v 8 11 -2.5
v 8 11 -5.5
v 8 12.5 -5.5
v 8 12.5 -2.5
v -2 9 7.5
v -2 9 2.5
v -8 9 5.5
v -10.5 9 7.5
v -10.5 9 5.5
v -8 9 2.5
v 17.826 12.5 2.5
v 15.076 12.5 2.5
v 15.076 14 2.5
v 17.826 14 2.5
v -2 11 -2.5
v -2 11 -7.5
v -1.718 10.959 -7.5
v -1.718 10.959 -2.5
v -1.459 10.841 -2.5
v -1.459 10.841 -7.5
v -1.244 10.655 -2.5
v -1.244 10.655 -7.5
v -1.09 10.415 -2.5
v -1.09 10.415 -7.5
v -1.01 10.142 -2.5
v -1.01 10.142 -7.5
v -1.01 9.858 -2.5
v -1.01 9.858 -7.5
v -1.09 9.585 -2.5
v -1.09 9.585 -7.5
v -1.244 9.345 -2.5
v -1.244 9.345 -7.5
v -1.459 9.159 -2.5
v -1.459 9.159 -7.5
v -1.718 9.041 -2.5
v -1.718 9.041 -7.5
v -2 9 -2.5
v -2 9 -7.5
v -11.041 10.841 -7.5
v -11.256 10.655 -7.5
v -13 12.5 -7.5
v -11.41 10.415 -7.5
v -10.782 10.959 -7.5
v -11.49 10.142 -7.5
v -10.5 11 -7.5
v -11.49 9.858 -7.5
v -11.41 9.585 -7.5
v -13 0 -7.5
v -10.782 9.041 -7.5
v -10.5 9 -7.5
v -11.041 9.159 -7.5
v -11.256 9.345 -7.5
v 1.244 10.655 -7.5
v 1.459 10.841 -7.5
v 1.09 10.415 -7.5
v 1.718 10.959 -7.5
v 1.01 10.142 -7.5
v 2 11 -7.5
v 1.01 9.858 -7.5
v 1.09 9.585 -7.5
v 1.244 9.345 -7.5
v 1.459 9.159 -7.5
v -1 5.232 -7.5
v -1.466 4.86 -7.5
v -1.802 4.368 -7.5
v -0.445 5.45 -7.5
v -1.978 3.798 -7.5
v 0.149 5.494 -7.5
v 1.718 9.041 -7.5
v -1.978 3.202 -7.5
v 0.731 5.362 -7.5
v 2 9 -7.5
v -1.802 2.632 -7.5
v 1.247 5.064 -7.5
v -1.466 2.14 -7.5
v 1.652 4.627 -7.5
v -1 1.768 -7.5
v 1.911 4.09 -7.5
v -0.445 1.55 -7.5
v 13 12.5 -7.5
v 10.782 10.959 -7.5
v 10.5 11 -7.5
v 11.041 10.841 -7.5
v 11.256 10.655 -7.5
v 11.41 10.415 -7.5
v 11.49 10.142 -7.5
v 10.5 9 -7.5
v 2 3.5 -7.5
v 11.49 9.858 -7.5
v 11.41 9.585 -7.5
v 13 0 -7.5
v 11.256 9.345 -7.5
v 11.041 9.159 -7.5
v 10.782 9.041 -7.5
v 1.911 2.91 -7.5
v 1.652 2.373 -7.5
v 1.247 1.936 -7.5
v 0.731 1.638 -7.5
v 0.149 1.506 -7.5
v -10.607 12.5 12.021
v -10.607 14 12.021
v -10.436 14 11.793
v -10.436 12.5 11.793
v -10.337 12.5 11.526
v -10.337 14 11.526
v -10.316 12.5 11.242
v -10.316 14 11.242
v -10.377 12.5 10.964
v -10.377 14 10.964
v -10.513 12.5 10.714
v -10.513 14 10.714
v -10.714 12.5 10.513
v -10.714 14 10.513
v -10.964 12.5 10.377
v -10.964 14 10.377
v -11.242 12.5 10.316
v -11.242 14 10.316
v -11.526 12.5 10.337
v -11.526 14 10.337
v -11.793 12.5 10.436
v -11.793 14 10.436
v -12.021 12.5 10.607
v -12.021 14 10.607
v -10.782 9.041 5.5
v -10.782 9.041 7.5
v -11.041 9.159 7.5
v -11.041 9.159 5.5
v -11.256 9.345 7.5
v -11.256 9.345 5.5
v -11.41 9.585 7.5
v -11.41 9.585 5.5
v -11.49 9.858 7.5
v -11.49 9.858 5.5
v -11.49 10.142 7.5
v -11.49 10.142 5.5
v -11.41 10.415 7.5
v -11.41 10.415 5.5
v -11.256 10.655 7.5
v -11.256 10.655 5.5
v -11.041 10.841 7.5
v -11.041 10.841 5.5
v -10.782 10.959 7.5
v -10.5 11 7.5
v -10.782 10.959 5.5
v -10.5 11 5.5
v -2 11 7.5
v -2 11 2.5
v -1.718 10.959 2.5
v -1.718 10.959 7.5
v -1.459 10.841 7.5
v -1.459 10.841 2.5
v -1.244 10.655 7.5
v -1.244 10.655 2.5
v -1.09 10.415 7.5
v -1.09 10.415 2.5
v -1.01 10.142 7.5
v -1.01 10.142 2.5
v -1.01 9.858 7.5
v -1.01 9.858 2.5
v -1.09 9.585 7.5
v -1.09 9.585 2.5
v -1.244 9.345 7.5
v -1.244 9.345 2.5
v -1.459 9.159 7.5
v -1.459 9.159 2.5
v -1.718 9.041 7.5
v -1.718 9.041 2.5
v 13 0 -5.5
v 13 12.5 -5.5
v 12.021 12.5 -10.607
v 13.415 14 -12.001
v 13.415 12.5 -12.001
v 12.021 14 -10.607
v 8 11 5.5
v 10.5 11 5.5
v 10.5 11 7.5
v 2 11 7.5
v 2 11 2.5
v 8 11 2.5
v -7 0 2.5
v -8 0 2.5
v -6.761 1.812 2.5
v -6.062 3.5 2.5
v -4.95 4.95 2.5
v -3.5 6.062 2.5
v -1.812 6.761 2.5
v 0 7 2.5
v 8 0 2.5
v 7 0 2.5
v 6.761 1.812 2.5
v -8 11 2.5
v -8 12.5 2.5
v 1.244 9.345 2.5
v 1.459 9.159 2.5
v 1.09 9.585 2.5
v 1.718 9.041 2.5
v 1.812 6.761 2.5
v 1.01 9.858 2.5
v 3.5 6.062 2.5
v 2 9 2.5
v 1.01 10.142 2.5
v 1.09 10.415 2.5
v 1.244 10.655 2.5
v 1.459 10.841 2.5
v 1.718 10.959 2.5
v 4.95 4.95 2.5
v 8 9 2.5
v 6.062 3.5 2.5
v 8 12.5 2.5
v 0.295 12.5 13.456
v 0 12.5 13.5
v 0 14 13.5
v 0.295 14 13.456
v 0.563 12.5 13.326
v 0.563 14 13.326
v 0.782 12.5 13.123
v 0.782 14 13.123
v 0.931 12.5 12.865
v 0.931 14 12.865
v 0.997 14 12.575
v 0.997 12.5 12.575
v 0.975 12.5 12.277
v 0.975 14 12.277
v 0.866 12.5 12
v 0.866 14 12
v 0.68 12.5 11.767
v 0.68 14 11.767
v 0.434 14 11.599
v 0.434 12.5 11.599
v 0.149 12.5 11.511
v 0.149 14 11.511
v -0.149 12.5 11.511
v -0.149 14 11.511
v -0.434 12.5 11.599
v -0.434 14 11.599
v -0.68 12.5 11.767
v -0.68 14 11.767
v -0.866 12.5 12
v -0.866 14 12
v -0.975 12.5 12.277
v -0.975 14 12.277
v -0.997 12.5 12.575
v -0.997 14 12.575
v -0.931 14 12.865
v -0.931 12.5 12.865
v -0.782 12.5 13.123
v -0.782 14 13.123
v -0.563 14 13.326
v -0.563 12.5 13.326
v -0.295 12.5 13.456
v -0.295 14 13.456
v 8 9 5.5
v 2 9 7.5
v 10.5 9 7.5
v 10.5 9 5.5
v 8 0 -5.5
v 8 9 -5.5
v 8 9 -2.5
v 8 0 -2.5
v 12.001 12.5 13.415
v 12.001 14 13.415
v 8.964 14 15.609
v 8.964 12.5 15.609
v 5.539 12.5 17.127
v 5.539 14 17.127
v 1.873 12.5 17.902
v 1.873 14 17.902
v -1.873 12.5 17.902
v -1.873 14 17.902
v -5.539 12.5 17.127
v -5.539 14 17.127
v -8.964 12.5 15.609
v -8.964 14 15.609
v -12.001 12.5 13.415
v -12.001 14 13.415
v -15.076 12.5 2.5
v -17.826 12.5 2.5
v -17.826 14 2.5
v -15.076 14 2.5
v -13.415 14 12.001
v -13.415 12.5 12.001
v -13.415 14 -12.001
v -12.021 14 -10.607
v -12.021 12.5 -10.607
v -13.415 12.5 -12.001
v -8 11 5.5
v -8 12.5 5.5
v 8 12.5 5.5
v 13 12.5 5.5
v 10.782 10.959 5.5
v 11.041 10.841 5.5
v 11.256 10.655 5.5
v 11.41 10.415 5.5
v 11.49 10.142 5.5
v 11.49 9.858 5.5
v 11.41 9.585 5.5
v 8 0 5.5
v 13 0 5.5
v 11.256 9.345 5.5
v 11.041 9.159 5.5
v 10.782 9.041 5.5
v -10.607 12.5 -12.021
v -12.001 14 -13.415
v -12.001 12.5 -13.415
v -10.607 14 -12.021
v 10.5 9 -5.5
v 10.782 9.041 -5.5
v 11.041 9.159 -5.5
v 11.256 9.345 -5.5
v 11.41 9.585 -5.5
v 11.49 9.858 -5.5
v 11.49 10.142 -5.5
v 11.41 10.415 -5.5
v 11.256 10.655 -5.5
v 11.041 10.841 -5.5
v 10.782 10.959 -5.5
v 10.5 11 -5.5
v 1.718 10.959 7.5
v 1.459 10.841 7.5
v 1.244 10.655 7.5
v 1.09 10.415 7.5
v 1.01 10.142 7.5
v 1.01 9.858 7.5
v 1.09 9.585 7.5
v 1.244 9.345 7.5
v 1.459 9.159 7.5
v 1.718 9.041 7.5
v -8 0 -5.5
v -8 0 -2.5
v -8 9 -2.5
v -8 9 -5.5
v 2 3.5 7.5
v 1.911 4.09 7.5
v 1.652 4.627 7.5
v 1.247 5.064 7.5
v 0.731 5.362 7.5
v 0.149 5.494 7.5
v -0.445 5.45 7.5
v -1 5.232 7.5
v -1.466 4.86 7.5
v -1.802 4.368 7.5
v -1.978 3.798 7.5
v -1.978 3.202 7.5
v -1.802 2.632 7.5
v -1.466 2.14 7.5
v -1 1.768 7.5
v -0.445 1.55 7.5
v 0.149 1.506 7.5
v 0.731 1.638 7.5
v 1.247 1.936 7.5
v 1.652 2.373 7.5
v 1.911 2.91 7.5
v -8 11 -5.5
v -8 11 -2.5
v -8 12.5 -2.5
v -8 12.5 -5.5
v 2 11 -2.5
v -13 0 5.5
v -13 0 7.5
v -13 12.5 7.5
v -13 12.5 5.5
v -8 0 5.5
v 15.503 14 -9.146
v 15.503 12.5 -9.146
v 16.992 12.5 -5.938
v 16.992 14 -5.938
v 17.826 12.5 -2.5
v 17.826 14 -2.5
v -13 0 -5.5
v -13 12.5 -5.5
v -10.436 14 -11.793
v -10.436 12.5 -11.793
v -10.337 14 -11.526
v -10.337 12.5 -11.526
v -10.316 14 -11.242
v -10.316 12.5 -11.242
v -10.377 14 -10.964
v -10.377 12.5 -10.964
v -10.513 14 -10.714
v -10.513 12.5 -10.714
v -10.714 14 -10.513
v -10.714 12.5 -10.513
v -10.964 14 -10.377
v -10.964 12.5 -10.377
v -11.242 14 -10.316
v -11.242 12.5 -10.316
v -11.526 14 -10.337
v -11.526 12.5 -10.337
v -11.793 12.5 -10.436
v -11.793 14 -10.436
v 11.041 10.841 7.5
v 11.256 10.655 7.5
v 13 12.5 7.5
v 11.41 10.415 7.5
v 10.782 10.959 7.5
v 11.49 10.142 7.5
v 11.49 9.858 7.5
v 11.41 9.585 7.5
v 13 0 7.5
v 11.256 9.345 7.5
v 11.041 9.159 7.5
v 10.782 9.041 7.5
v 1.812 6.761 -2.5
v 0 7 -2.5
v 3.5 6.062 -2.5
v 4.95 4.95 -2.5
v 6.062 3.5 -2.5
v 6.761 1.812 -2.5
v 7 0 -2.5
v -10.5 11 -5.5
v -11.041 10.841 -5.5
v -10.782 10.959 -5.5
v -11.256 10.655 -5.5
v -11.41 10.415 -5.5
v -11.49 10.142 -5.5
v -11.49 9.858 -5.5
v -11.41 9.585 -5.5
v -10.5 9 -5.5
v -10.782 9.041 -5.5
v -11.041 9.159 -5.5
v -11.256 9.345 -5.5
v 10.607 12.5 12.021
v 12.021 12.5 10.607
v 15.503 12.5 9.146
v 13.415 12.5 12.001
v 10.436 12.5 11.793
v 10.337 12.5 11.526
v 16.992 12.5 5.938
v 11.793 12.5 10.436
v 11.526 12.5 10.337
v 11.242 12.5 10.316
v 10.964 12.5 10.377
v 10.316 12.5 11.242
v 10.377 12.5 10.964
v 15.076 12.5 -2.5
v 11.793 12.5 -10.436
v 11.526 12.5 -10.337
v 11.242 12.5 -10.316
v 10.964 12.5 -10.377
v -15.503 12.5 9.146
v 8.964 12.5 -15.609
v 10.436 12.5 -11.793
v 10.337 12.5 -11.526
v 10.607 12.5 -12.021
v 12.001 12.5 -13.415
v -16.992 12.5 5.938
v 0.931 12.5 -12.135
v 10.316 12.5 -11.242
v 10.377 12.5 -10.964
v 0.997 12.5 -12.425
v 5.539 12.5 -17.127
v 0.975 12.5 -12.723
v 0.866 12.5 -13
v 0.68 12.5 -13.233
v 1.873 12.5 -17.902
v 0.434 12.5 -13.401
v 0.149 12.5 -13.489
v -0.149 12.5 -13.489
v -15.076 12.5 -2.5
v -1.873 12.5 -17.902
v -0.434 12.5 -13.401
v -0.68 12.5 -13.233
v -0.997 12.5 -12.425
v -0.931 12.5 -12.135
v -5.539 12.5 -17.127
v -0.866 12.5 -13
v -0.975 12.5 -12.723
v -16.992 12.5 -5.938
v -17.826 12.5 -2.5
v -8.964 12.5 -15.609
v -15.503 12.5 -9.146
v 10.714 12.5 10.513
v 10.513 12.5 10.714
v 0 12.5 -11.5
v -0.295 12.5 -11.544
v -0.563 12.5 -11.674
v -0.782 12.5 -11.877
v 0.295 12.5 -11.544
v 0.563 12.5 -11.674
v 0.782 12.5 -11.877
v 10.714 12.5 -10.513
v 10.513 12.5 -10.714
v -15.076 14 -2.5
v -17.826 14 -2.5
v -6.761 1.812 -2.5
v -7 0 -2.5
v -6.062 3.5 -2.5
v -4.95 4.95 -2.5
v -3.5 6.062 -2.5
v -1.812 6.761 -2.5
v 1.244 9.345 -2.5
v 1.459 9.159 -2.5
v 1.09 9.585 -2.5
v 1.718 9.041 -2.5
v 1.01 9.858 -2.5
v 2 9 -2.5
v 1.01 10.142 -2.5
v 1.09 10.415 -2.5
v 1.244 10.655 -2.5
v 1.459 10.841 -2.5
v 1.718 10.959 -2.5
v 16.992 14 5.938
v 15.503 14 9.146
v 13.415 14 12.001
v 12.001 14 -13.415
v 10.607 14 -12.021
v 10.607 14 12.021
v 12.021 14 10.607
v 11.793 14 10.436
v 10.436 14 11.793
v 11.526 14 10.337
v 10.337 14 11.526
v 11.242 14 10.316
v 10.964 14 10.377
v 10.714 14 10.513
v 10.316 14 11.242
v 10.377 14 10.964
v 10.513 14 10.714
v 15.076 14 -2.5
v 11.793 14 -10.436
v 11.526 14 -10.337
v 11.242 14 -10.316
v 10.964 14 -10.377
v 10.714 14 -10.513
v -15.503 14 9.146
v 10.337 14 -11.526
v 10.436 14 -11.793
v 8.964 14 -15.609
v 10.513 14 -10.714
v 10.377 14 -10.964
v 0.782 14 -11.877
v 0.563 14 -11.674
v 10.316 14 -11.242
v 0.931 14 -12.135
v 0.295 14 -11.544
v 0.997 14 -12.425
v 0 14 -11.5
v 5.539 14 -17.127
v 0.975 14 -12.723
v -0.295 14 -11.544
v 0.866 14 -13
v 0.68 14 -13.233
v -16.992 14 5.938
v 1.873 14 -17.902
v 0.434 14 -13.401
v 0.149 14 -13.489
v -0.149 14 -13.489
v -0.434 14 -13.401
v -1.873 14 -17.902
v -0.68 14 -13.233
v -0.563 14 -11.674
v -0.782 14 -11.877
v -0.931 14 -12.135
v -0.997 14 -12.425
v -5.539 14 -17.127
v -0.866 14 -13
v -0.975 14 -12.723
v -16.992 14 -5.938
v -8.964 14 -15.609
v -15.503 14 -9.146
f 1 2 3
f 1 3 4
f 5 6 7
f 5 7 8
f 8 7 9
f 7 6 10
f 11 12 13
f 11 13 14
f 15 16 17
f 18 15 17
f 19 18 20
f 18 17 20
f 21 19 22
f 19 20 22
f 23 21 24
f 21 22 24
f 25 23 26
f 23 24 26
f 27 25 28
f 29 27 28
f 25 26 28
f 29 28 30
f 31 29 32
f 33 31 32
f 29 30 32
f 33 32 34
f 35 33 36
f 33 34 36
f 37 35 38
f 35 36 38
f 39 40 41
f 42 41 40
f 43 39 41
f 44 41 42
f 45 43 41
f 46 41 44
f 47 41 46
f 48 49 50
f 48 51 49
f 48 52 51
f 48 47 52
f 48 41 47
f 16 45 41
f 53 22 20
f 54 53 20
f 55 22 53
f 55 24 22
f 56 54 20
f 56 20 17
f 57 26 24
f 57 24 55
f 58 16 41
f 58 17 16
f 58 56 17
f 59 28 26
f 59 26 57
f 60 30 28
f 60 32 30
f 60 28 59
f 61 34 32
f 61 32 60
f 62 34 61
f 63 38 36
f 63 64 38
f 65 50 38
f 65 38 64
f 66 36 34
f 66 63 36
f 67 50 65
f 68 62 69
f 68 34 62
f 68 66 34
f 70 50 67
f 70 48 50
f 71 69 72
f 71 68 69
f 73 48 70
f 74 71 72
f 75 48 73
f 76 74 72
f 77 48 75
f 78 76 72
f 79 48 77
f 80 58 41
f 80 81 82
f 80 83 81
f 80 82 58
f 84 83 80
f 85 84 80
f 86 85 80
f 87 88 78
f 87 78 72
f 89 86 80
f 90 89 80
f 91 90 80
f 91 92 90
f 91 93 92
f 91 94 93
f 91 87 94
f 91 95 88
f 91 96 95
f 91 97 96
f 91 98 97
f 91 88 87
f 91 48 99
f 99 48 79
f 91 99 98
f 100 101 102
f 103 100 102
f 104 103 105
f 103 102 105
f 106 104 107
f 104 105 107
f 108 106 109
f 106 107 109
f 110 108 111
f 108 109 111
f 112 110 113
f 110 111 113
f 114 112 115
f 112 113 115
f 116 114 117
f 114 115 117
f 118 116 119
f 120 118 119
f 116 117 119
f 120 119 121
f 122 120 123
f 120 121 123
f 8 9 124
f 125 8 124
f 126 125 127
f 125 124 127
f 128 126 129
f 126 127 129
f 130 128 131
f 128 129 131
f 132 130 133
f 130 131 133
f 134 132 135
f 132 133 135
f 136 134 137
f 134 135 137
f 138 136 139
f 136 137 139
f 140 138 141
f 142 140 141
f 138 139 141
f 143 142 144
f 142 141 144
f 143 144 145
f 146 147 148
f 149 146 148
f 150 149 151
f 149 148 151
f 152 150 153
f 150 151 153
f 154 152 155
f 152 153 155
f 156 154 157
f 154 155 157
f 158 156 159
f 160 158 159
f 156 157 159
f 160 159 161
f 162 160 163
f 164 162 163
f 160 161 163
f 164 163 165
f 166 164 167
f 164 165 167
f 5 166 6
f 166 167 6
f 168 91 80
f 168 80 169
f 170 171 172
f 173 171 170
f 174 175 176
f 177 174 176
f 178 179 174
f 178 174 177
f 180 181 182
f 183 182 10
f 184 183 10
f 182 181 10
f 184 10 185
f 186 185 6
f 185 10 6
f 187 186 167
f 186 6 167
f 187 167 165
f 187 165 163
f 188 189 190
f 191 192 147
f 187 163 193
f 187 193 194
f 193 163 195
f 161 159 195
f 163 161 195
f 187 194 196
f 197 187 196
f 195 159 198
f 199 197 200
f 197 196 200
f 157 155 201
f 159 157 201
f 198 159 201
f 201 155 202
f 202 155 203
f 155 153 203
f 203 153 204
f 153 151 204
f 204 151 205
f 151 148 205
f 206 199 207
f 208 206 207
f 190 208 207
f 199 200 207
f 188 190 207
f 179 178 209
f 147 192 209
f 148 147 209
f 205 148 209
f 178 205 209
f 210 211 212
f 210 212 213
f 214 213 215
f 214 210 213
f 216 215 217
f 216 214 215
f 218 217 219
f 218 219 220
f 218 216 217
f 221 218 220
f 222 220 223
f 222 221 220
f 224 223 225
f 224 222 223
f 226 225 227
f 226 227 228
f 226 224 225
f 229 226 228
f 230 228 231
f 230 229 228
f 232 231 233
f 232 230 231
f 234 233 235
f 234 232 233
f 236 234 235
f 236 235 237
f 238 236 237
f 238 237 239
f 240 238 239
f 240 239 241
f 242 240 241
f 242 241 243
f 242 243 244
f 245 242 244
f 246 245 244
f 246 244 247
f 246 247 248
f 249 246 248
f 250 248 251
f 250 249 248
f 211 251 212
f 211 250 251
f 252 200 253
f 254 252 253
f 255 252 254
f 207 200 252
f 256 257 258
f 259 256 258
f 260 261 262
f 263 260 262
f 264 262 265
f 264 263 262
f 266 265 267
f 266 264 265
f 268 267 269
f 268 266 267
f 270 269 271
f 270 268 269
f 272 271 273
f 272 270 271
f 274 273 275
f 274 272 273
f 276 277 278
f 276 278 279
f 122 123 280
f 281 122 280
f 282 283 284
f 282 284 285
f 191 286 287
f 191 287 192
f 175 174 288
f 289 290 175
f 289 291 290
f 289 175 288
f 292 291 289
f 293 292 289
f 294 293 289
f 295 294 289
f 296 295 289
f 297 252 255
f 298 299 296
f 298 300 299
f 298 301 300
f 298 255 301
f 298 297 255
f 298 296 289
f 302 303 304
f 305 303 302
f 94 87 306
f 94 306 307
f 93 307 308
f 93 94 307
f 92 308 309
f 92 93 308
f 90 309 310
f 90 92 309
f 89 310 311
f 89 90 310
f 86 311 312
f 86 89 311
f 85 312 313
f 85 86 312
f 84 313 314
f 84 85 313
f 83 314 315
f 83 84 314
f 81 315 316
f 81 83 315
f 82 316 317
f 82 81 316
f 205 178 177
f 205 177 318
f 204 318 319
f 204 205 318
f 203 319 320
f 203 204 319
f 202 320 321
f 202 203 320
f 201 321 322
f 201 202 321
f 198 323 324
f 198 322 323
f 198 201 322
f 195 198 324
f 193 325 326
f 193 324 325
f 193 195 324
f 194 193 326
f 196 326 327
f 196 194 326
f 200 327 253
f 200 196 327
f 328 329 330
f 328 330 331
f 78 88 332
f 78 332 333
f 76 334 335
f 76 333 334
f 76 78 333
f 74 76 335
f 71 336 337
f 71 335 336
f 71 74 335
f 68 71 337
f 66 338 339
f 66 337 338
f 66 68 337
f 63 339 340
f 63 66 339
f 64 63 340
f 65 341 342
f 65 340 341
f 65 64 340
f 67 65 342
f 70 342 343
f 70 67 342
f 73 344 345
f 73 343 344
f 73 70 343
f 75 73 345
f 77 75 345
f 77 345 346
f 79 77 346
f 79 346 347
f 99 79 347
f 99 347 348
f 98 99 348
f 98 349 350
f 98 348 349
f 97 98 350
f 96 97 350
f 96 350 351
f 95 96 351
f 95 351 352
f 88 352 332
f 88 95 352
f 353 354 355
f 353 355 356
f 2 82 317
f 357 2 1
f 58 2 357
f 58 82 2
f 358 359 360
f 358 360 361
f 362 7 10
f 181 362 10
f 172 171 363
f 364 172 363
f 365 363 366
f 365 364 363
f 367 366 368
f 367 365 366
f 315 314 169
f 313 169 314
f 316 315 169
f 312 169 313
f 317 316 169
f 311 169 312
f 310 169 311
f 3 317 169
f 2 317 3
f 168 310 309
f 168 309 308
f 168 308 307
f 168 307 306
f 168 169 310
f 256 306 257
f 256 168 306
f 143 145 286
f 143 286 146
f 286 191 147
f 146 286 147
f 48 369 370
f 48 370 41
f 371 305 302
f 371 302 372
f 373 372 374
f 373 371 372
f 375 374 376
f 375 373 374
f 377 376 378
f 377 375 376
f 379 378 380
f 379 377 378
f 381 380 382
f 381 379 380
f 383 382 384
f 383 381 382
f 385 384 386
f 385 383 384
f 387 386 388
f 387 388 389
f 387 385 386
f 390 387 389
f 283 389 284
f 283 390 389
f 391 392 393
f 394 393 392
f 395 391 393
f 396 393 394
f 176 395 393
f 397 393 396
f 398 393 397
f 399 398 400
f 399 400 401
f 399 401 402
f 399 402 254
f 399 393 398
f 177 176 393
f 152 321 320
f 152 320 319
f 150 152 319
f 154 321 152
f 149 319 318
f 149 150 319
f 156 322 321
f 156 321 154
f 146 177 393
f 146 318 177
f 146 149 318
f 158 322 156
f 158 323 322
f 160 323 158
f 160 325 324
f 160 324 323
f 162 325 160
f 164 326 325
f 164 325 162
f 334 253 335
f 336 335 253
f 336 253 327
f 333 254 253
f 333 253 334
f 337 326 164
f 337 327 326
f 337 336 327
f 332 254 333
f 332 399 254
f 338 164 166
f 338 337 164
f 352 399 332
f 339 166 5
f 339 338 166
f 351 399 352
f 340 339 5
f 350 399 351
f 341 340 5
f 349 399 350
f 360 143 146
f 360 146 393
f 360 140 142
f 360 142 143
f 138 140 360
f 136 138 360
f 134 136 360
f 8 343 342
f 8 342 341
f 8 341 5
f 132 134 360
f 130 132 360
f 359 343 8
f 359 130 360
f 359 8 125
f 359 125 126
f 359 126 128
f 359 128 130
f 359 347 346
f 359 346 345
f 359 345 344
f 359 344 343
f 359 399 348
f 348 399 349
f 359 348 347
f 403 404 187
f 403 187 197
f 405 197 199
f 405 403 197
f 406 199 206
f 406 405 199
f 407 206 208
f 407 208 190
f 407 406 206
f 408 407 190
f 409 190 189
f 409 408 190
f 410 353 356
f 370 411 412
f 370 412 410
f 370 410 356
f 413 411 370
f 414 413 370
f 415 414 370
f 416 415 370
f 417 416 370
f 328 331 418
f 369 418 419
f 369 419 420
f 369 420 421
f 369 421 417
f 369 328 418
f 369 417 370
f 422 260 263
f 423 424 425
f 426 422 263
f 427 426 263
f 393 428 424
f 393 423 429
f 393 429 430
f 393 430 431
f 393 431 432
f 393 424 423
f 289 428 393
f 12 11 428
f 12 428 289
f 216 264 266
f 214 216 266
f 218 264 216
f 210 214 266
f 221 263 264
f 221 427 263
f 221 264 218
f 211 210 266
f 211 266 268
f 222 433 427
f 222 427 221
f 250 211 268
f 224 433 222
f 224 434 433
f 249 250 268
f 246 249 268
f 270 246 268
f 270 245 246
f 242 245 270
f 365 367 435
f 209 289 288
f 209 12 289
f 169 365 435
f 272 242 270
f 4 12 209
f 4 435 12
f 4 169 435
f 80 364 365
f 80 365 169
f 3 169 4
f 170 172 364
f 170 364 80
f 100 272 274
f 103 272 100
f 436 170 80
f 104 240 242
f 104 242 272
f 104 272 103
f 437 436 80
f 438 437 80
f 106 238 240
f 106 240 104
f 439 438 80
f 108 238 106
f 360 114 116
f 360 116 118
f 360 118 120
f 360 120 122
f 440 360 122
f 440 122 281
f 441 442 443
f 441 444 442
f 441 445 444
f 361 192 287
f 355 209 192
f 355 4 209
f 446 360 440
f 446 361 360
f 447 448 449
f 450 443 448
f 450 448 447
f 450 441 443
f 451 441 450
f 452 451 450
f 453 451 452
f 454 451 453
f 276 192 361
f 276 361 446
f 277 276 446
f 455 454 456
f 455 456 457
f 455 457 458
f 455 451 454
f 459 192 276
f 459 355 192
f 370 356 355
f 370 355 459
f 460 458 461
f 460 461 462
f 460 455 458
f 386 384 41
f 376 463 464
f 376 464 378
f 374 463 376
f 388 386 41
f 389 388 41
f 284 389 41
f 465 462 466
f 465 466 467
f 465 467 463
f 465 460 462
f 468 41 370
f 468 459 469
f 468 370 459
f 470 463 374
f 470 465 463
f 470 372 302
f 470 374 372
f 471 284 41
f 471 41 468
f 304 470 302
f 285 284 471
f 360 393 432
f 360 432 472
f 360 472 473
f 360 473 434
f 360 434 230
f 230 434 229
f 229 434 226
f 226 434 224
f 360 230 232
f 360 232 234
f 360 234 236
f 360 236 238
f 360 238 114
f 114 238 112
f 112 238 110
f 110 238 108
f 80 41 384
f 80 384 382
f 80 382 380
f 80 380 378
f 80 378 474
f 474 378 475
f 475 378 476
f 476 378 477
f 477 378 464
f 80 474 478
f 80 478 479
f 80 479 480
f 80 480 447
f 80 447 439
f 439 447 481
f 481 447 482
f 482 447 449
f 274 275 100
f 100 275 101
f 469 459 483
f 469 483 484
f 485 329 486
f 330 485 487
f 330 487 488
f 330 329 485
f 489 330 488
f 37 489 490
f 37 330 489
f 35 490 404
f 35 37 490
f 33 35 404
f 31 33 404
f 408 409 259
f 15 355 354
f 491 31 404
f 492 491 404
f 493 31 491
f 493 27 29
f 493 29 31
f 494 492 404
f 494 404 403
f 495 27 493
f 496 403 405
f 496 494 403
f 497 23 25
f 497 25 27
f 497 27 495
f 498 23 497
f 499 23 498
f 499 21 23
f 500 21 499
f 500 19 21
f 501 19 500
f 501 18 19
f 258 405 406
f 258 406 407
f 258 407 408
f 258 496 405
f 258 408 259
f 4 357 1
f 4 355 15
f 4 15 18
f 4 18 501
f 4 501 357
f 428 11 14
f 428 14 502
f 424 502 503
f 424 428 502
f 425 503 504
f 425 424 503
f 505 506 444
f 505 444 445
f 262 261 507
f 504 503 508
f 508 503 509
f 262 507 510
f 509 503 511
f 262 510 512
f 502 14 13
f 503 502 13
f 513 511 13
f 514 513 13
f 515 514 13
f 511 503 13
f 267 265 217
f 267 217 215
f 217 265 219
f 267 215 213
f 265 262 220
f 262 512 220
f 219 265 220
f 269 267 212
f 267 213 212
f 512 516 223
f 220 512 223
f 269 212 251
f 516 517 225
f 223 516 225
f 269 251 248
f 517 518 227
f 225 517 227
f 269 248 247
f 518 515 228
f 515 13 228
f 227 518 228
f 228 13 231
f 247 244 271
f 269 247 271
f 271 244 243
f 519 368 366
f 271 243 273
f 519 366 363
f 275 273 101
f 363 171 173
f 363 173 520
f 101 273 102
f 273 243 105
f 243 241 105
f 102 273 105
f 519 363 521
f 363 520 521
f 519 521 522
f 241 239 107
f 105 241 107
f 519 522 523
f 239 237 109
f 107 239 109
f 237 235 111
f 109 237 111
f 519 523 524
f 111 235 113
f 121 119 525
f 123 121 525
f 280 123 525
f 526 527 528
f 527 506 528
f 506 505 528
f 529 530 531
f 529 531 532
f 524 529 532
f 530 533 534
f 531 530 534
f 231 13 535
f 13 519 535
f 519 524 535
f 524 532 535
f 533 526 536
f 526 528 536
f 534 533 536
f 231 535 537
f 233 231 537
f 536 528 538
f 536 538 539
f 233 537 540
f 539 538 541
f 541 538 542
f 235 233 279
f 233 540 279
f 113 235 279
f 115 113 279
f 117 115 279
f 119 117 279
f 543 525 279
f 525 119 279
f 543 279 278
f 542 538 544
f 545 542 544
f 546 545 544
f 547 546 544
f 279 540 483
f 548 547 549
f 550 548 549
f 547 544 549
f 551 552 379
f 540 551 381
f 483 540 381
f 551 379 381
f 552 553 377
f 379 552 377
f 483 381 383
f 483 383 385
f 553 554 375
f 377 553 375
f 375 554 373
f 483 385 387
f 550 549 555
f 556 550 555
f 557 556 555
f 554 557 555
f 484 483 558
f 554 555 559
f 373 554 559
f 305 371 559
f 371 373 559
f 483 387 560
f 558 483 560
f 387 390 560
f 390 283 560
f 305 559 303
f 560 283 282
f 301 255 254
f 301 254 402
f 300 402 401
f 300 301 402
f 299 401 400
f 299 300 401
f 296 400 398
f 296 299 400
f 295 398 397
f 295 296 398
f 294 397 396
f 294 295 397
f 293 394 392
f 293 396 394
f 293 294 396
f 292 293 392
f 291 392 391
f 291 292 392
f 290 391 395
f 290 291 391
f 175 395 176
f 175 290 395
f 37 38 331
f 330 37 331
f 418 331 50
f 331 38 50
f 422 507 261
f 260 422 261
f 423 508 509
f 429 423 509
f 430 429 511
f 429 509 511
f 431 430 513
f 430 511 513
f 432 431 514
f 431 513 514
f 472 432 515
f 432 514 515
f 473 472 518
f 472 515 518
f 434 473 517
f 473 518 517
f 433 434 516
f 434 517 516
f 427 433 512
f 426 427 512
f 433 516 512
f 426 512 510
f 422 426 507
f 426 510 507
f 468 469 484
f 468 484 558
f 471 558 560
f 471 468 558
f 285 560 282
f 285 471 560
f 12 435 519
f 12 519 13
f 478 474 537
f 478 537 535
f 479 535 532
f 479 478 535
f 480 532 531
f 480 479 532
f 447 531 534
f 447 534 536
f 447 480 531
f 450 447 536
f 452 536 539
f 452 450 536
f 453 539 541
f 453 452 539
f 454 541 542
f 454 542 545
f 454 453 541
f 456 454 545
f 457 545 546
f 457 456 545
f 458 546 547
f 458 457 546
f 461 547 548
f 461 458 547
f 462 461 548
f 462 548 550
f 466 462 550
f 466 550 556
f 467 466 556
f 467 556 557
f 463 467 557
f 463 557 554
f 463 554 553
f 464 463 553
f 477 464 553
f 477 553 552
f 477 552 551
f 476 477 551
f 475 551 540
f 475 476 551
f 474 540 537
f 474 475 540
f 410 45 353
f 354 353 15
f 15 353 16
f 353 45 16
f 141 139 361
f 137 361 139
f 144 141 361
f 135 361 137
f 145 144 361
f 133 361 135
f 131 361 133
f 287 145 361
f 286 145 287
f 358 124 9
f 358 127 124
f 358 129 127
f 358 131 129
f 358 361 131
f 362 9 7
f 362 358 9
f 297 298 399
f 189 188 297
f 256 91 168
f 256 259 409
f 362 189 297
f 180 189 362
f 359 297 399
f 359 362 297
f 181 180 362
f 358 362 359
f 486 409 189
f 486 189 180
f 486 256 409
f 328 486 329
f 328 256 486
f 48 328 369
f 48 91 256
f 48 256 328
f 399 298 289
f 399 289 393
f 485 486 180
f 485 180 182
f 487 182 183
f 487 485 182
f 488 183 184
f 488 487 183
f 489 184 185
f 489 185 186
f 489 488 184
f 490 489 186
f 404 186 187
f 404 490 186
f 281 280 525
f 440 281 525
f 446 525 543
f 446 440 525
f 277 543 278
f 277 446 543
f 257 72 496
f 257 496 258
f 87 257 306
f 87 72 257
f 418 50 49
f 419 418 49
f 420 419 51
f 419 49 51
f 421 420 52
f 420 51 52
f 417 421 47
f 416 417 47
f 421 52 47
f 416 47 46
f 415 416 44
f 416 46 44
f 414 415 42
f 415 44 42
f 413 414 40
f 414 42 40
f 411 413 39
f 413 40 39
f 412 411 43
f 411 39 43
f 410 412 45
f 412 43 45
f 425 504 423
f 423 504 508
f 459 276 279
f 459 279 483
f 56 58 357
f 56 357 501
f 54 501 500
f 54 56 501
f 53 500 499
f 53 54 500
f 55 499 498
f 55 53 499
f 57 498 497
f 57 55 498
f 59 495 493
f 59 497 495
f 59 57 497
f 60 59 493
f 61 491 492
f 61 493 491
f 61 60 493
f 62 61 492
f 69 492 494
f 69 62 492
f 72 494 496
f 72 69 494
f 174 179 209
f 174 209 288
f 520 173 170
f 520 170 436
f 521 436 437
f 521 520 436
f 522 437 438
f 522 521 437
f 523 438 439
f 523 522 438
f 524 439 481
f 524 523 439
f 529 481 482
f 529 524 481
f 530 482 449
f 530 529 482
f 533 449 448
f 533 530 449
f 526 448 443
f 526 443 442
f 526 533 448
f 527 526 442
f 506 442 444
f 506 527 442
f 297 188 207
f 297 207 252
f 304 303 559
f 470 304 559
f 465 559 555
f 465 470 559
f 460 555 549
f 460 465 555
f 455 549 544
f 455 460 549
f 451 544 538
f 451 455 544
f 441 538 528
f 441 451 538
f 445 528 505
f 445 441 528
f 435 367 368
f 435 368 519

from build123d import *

# Parameters (mm, degrees)
EXTRUDE_1_DEPTH          = 12.5
CUT_EXTRUDE_1_DEPTH      = 20.532024985
CUT_EXTRUDE_1_DEPTH_BACK = 20.532024985
SKETCH_2_R               = 2
CUT_EXTRUDE_2_DEPTH      = 20.532024985
CUT_EXTRUDE_2_DEPTH_BACK = 20.532024985
CUT_EXTRUDE_START        = 12.5
SKETCH_5_W               = 16
SKETCH_5_H               = 5
CUT_EXTRUDE_4_DEPTH      = 5.5
CUT_EXTRUDE_5_DEPTH      = 2.5
CUT_EXTRUDE_5_DEPTH_BACK = 2.5
EXTRUDE_START            = 12.5
EXTRUDE_5_DEPTH          = 1.5
SKETCH_8_R               = 1
CUT_EXTRUDE_6_DEPTH      = 1.5
CUT_EXTRUDE_START_2      = 14
CUT_EXTRUDE_7_DEPTH      = 1.5


with BuildPart() as part:
    # 草图1 → 凸台-拉伸1 (new body)
    with BuildSketch(Plane(origin=(0, 0, 0), x_dir=(1, 0, 0), z_dir=(0, 1, 0))):
        Polygon((13, 5.5), (8, 5.5), (8, -5.5), (13, -5.5), (13, -7.5), (-13, -7.5), (-13, -5.5), (-8, -5.5), (-8, 5.5), (-13, 5.5), (-13, 7.5), (13, 7.5), align=None)
    extrude(amount=EXTRUDE_1_DEPTH)

    # 草图2 → 切除-拉伸1 (cut, two sides: drawn at the far end of the back side and taken through both)
    with BuildSketch(Plane.XY.offset(-CUT_EXTRUDE_1_DEPTH_BACK)):
        with Locations((0, 3.5)):
            Circle(SKETCH_2_R)
    extrude(amount=CUT_EXTRUDE_1_DEPTH + CUT_EXTRUDE_1_DEPTH_BACK, mode=Mode.SUBTRACT)

    # 草图3 → 切除-拉伸2 (cut, two sides: drawn at the far end of the back side and taken through both)
    with BuildSketch(Plane.XY.offset(-CUT_EXTRUDE_2_DEPTH_BACK)):
        with BuildLine():
            Line((-10.5, 11), (-2, 11))
            ThreePointArc((-2, 11), (-1, 10), (-2, 9))
            Line((-2, 9), (-10.5, 9))
            ThreePointArc((-10.5, 9), (-11.5, 10), (-10.5, 11))
        make_face()
        with BuildLine():
            Line((2, 9), (10.5, 9))
            ThreePointArc((10.5, 9), (11.5, 10), (10.5, 11))
            Line((10.5, 11), (2, 11))
            ThreePointArc((2, 11), (1, 10), (2, 9))
        make_face()
    extrude(amount=CUT_EXTRUDE_2_DEPTH + CUT_EXTRUDE_2_DEPTH_BACK, mode=Mode.SUBTRACT)

    # 草图5 → 切除-拉伸4 (cut)
    with BuildSketch(Plane(origin=(0, 0, 0), x_dir=(1, 0, 0), z_dir=(0, 1, 0)).offset(CUT_EXTRUDE_START)):
        Rectangle(SKETCH_5_W, SKETCH_5_H)
    extrude(amount=-CUT_EXTRUDE_4_DEPTH, mode=Mode.SUBTRACT)

    # 草图6 → 切除-拉伸5 (cut, two sides: drawn at the far end of the back side and taken through both)
    with BuildSketch(Plane.XY.offset(-CUT_EXTRUDE_5_DEPTH_BACK)):
        with BuildLine():
            Line((8, 7), (0, 7))
            ThreePointArc((0, 7), (4.949747468, 4.949747468), (7, 0))
            Line((7, 0), (8, 0))
            Line((8, 0), (8, 7))
        make_face()
        with BuildLine():
            Line((-8, 7), (-8, 0))
            Line((-8, 0), (-7, 0))
            ThreePointArc((-7, 0), (-4.949747468, 4.949747468), (0, 7))
            Line((0, 7), (-8, 7))
        make_face()
    extrude(amount=CUT_EXTRUDE_5_DEPTH + CUT_EXTRUDE_5_DEPTH_BACK, mode=Mode.SUBTRACT)

    # 草图7 → 凸台-拉伸5 (add)
    with BuildSketch(Plane(origin=(0, 0, 0), x_dir=(1, 0, 0), z_dir=(0, 1, 0)).offset(EXTRUDE_START)):
        with BuildLine():
            Line((17.82554347, 2.5), (15.07554347, 2.5))
            Line((15.07554347, 2.5), (15.07554347, -2.5))
            Line((15.07554347, -2.5), (17.82554347, -2.5))
            ThreePointArc((17.82554347, -2.5), (0, -18), (-17.82554347, -2.5))
            Line((-17.82554347, -2.5), (-15.07554347, -2.5))
            Line((-15.07554347, -2.5), (-15.07554347, 2.5))
            Line((-15.07554347, 2.5), (-17.82554347, 2.5))
            ThreePointArc((-17.82554347, 2.5), (0, 18), (17.82554347, 2.5))
        make_face()
    extrude(amount=EXTRUDE_5_DEPTH)

    # 草图8 → 切除-拉伸6 (cut)
    with BuildSketch(Plane(origin=(0, 0, 0), x_dir=(1, 0, 0), z_dir=(0, 1, 0)).offset(CUT_EXTRUDE_START)):
        with Locations(Location((0, 12.5, 0), (0, 0, 270))):
            Circle(SKETCH_8_R)
        with Locations(Location((0, -12.5, 0), (0, 0, 270))):
            Circle(SKETCH_8_R)
    extrude(amount=CUT_EXTRUDE_6_DEPTH, mode=Mode.SUBTRACT)

    # 草图9 → 切除-拉伸7 (cut)
    with BuildSketch(Plane(origin=(0, 0, 0), x_dir=(1, 0, 0), z_dir=(0, 1, 0)).offset(CUT_EXTRUDE_START_2)):
        with BuildLine():
            Line((-12.02081528, 10.606601718), (-13.435028843, 12.02081528))
            ThreePointArc((-13.435028843, 12.02081528), (-13.435028843, 13.435028843), (-12.02081528, 13.435028843))
            Line((-12.02081528, 13.435028843), (-10.606601718, 12.02081528))
            ThreePointArc((-10.606601718, 12.02081528), (-10.606601718, 10.606601718), (-12.02081528, 10.606601718))
        make_face()
        with BuildLine():
            Line((10.606601718, -12.02081528), (12.02081528, -13.435028843))
            ThreePointArc((12.02081528, -13.435028843), (13.435028843, -13.435028843), (13.435028843, -12.02081528))
            Line((13.435028843, -12.02081528), (12.02081528, -10.606601718))
            ThreePointArc((12.02081528, -10.606601718), (10.606601718, -10.606601718), (10.606601718, -12.02081528))
        make_face()
        with BuildLine():
            Line((-12.02081528, -10.606601718), (-13.435028843, -12.02081528))
            ThreePointArc((-13.435028843, -12.02081528), (-13.435028843, -13.435028843), (-12.02081528, -13.435028843))
            Line((-12.02081528, -13.435028843), (-10.606601718, -12.02081528))
            ThreePointArc((-10.606601718, -12.02081528), (-10.606601718, -10.606601718), (-12.02081528, -10.606601718))
        make_face()
        with BuildLine():
            Line((10.606601718, 12.02081528), (12.02081528, 13.435028843))
            ThreePointArc((12.02081528, 13.435028843), (13.435028843, 13.435028843), (13.435028843, 12.02081528))
            Line((13.435028843, 12.02081528), (12.02081528, 10.606601718))
            ThreePointArc((12.02081528, 10.606601718), (10.606601718, 10.606601718), (10.606601718, 12.02081528))
        make_face()
    extrude(amount=-CUT_EXTRUDE_7_DEPTH, mode=Mode.SUBTRACT)


solid = part.part
